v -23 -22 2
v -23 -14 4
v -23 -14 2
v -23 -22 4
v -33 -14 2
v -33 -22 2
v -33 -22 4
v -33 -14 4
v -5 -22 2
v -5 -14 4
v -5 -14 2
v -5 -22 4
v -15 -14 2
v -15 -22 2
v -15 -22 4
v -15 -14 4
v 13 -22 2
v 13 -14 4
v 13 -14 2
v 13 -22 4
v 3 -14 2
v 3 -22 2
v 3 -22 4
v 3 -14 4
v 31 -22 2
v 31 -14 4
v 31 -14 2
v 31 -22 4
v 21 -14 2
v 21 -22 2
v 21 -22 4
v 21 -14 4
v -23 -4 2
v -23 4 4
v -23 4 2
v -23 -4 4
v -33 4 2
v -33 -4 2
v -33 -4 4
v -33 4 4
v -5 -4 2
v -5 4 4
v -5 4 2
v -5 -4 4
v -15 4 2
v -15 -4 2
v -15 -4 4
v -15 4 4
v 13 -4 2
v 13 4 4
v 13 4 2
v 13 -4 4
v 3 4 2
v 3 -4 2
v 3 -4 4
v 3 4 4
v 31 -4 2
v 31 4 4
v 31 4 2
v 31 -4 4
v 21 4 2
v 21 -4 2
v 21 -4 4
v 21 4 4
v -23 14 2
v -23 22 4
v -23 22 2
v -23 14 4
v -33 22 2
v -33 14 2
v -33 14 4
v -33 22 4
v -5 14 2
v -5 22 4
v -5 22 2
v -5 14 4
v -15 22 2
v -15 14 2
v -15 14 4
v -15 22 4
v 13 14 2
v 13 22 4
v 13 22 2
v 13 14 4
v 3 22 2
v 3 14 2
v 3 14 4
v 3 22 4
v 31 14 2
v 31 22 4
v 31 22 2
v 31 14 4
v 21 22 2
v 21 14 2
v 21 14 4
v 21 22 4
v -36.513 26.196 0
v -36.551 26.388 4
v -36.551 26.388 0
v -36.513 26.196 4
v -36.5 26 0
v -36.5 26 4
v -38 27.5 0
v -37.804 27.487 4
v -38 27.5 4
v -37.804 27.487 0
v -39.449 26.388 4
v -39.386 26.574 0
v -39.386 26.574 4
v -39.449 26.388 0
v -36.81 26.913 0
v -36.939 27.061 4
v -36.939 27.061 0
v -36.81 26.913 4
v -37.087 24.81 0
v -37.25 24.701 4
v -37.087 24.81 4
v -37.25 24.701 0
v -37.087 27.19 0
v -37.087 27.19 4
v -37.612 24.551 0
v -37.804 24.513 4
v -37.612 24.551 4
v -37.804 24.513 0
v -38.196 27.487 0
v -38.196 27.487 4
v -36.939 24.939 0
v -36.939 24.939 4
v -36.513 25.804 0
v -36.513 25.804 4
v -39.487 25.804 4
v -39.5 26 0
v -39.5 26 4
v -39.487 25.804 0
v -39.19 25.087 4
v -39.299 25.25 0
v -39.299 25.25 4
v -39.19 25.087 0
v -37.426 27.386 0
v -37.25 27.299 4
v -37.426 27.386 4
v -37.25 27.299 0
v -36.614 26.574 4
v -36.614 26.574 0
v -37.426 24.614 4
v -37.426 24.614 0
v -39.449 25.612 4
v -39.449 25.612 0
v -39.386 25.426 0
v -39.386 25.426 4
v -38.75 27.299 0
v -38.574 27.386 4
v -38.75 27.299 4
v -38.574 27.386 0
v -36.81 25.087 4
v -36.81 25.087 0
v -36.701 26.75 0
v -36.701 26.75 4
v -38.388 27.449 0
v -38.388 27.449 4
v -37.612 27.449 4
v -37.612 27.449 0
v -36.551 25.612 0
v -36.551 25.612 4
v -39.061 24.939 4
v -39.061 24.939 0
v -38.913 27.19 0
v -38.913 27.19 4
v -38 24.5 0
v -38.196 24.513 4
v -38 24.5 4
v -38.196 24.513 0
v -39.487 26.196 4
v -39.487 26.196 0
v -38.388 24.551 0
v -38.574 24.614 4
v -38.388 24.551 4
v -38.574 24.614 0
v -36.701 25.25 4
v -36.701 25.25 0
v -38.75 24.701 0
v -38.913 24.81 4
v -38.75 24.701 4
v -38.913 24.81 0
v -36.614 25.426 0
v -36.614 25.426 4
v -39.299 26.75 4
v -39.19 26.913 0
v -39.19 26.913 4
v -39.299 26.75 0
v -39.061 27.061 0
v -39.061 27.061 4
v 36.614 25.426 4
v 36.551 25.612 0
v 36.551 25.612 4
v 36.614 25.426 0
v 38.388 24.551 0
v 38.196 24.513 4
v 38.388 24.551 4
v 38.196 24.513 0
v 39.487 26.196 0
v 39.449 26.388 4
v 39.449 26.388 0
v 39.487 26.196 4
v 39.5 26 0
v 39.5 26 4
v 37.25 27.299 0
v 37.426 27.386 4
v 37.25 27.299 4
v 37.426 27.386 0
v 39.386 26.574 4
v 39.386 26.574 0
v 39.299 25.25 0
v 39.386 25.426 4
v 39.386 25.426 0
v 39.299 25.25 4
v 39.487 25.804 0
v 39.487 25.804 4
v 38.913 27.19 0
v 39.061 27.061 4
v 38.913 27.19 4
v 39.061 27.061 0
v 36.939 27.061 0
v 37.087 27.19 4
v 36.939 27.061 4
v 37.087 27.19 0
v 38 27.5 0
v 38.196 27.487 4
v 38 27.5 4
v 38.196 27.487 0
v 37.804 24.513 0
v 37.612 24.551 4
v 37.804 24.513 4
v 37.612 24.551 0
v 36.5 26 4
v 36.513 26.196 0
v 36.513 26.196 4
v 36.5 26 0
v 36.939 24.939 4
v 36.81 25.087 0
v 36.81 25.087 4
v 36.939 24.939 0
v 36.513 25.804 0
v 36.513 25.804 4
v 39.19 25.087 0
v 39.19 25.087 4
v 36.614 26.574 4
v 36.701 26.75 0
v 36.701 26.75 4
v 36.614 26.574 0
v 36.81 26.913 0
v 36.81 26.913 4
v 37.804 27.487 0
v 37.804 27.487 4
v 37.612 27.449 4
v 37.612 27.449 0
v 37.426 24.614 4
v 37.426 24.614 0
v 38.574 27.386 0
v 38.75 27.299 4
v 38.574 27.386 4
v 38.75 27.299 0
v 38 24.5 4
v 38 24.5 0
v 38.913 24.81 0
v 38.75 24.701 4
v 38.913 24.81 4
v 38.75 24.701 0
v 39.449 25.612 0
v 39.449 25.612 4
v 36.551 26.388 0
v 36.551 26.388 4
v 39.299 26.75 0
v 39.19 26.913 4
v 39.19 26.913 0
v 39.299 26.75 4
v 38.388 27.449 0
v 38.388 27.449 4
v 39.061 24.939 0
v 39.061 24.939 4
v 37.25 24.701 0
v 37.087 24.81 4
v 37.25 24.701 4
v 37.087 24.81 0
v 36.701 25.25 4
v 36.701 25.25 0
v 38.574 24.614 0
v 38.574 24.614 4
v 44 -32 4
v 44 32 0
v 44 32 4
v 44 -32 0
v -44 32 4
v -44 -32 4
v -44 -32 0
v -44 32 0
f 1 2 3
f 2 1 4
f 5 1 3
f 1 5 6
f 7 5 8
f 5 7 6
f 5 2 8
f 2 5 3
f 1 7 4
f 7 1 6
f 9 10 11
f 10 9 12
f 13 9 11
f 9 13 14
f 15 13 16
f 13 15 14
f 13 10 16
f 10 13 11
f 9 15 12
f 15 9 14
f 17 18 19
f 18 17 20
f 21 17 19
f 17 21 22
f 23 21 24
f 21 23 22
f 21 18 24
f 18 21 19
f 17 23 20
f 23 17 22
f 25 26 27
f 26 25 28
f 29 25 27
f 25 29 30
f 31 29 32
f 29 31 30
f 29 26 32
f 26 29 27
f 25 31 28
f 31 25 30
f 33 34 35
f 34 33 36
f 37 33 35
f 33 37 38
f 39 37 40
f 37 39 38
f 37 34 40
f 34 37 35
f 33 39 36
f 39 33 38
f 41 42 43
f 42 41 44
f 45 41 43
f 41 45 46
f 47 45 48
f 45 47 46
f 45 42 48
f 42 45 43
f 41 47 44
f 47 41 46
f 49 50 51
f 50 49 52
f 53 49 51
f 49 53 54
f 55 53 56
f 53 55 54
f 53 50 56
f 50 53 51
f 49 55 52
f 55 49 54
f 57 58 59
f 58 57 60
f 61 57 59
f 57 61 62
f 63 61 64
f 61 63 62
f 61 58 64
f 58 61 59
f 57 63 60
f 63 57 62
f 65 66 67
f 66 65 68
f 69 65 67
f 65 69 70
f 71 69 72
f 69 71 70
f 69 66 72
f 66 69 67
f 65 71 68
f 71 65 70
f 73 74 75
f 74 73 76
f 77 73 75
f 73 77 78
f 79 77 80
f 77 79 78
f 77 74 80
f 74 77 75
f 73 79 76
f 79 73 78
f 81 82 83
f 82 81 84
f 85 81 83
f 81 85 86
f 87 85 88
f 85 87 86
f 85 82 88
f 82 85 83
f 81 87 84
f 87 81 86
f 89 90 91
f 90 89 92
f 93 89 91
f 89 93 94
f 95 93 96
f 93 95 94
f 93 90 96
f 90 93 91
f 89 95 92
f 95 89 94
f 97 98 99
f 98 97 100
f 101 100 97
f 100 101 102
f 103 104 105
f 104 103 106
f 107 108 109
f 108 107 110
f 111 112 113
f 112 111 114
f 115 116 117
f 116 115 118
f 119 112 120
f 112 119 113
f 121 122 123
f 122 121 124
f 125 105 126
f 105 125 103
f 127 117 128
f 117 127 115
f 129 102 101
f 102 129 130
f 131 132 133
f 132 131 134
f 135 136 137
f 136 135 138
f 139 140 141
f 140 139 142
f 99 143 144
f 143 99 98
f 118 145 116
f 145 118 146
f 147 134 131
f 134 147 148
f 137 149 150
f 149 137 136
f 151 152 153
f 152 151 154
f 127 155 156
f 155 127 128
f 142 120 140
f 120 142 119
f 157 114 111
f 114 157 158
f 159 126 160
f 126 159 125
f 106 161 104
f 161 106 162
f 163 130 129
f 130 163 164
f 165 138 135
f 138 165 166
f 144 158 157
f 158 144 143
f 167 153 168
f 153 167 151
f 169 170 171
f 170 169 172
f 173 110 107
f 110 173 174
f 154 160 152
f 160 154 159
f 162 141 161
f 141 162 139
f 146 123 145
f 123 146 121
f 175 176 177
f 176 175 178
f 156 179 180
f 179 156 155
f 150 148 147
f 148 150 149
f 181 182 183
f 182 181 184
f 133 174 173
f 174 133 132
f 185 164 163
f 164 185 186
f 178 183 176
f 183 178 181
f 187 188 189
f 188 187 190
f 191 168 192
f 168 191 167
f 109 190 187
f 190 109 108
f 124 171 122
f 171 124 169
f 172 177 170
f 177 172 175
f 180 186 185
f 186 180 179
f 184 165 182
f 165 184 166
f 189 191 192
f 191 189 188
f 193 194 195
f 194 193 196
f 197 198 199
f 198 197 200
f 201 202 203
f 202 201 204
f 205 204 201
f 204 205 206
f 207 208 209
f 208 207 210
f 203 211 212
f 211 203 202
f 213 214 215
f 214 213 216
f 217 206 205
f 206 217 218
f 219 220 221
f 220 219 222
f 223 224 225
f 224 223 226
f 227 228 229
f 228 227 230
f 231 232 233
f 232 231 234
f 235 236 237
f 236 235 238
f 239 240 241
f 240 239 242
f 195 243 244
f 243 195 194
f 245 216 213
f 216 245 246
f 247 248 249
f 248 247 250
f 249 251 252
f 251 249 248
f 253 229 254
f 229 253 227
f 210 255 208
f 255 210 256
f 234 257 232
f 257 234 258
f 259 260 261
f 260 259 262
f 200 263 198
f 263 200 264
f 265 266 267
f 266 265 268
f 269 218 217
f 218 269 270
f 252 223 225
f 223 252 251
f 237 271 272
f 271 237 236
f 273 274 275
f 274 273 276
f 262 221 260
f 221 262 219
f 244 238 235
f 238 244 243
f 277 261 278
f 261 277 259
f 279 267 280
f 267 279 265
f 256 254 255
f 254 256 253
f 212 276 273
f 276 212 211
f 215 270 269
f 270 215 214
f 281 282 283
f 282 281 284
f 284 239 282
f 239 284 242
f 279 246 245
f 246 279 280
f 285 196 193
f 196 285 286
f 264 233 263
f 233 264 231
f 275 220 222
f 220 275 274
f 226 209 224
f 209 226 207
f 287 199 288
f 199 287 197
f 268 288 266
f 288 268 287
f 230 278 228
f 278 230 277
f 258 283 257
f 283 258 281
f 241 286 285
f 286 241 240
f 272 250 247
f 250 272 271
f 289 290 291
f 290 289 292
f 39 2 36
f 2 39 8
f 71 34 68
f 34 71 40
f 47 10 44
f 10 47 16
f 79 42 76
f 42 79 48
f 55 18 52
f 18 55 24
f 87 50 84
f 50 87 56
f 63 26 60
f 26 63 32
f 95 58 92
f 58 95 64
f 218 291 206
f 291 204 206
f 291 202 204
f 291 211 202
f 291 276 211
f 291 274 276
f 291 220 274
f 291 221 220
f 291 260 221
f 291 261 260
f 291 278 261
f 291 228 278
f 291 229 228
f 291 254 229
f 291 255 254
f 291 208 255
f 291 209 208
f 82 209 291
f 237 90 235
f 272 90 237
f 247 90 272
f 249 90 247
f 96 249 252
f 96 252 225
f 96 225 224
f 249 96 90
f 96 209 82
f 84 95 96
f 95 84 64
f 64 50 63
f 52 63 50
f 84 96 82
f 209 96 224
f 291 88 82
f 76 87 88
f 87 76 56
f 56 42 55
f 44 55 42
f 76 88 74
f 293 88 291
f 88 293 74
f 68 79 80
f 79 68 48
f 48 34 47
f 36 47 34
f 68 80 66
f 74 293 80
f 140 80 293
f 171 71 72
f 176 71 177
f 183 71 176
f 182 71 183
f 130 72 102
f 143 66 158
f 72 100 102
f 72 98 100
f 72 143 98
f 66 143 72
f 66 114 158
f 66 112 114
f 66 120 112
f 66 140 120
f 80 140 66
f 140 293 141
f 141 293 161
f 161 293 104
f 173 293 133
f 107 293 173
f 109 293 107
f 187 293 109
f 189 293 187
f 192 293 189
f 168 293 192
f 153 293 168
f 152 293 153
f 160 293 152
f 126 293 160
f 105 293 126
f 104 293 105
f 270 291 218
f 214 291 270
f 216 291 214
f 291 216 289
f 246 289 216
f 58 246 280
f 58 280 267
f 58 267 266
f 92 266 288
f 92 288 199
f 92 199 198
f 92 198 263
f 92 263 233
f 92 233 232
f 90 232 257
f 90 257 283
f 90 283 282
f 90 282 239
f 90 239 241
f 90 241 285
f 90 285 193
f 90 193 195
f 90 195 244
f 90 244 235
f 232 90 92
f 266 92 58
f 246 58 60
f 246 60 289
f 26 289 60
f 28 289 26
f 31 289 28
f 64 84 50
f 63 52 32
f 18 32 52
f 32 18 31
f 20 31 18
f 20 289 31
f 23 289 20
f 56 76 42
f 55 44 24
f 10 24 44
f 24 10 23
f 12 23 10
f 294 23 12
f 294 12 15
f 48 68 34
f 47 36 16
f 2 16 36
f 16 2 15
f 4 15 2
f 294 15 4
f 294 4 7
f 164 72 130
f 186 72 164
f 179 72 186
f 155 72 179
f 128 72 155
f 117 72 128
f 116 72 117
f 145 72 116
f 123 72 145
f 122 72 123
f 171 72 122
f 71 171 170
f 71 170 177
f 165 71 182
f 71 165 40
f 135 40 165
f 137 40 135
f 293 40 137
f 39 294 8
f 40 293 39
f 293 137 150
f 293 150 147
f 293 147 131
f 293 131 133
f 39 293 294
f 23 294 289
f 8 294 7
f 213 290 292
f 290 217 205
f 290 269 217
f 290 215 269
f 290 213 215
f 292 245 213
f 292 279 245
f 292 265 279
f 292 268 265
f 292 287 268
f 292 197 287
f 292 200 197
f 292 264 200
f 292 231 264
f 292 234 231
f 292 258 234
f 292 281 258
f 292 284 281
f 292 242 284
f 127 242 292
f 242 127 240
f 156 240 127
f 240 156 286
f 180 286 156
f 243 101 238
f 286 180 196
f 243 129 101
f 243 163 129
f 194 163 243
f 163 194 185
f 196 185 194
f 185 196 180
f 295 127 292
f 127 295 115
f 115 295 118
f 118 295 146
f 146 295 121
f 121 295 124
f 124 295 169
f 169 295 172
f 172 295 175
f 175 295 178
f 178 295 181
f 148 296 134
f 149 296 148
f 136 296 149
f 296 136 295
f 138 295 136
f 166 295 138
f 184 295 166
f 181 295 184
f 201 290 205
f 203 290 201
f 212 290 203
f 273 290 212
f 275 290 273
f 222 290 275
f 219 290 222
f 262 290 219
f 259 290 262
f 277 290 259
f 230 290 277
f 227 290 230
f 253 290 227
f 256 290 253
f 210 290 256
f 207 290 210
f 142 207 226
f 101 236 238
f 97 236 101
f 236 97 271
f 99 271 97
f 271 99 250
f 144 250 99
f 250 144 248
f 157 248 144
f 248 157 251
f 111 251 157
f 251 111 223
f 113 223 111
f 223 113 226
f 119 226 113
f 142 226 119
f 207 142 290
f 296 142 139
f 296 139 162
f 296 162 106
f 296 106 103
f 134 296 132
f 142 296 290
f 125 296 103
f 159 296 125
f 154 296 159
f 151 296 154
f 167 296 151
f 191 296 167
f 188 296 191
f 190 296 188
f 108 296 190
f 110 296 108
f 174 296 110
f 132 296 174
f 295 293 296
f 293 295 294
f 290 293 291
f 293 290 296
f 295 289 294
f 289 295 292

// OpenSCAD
$fn = 48;
module qfn_tray() {
    difference() {
        translate([-44,-32,0]) cube([88,64,4]);
        for (row=[0:2]) for (col=[0:3]) translate([-28+col*18,-18+row*18,3.05]) cube([10,8,2.1], center=true);
        for (x=[-38,38]) translate([x,26,-1]) cylinder(h=6,d=3);
    }
}
qfn_tray();
